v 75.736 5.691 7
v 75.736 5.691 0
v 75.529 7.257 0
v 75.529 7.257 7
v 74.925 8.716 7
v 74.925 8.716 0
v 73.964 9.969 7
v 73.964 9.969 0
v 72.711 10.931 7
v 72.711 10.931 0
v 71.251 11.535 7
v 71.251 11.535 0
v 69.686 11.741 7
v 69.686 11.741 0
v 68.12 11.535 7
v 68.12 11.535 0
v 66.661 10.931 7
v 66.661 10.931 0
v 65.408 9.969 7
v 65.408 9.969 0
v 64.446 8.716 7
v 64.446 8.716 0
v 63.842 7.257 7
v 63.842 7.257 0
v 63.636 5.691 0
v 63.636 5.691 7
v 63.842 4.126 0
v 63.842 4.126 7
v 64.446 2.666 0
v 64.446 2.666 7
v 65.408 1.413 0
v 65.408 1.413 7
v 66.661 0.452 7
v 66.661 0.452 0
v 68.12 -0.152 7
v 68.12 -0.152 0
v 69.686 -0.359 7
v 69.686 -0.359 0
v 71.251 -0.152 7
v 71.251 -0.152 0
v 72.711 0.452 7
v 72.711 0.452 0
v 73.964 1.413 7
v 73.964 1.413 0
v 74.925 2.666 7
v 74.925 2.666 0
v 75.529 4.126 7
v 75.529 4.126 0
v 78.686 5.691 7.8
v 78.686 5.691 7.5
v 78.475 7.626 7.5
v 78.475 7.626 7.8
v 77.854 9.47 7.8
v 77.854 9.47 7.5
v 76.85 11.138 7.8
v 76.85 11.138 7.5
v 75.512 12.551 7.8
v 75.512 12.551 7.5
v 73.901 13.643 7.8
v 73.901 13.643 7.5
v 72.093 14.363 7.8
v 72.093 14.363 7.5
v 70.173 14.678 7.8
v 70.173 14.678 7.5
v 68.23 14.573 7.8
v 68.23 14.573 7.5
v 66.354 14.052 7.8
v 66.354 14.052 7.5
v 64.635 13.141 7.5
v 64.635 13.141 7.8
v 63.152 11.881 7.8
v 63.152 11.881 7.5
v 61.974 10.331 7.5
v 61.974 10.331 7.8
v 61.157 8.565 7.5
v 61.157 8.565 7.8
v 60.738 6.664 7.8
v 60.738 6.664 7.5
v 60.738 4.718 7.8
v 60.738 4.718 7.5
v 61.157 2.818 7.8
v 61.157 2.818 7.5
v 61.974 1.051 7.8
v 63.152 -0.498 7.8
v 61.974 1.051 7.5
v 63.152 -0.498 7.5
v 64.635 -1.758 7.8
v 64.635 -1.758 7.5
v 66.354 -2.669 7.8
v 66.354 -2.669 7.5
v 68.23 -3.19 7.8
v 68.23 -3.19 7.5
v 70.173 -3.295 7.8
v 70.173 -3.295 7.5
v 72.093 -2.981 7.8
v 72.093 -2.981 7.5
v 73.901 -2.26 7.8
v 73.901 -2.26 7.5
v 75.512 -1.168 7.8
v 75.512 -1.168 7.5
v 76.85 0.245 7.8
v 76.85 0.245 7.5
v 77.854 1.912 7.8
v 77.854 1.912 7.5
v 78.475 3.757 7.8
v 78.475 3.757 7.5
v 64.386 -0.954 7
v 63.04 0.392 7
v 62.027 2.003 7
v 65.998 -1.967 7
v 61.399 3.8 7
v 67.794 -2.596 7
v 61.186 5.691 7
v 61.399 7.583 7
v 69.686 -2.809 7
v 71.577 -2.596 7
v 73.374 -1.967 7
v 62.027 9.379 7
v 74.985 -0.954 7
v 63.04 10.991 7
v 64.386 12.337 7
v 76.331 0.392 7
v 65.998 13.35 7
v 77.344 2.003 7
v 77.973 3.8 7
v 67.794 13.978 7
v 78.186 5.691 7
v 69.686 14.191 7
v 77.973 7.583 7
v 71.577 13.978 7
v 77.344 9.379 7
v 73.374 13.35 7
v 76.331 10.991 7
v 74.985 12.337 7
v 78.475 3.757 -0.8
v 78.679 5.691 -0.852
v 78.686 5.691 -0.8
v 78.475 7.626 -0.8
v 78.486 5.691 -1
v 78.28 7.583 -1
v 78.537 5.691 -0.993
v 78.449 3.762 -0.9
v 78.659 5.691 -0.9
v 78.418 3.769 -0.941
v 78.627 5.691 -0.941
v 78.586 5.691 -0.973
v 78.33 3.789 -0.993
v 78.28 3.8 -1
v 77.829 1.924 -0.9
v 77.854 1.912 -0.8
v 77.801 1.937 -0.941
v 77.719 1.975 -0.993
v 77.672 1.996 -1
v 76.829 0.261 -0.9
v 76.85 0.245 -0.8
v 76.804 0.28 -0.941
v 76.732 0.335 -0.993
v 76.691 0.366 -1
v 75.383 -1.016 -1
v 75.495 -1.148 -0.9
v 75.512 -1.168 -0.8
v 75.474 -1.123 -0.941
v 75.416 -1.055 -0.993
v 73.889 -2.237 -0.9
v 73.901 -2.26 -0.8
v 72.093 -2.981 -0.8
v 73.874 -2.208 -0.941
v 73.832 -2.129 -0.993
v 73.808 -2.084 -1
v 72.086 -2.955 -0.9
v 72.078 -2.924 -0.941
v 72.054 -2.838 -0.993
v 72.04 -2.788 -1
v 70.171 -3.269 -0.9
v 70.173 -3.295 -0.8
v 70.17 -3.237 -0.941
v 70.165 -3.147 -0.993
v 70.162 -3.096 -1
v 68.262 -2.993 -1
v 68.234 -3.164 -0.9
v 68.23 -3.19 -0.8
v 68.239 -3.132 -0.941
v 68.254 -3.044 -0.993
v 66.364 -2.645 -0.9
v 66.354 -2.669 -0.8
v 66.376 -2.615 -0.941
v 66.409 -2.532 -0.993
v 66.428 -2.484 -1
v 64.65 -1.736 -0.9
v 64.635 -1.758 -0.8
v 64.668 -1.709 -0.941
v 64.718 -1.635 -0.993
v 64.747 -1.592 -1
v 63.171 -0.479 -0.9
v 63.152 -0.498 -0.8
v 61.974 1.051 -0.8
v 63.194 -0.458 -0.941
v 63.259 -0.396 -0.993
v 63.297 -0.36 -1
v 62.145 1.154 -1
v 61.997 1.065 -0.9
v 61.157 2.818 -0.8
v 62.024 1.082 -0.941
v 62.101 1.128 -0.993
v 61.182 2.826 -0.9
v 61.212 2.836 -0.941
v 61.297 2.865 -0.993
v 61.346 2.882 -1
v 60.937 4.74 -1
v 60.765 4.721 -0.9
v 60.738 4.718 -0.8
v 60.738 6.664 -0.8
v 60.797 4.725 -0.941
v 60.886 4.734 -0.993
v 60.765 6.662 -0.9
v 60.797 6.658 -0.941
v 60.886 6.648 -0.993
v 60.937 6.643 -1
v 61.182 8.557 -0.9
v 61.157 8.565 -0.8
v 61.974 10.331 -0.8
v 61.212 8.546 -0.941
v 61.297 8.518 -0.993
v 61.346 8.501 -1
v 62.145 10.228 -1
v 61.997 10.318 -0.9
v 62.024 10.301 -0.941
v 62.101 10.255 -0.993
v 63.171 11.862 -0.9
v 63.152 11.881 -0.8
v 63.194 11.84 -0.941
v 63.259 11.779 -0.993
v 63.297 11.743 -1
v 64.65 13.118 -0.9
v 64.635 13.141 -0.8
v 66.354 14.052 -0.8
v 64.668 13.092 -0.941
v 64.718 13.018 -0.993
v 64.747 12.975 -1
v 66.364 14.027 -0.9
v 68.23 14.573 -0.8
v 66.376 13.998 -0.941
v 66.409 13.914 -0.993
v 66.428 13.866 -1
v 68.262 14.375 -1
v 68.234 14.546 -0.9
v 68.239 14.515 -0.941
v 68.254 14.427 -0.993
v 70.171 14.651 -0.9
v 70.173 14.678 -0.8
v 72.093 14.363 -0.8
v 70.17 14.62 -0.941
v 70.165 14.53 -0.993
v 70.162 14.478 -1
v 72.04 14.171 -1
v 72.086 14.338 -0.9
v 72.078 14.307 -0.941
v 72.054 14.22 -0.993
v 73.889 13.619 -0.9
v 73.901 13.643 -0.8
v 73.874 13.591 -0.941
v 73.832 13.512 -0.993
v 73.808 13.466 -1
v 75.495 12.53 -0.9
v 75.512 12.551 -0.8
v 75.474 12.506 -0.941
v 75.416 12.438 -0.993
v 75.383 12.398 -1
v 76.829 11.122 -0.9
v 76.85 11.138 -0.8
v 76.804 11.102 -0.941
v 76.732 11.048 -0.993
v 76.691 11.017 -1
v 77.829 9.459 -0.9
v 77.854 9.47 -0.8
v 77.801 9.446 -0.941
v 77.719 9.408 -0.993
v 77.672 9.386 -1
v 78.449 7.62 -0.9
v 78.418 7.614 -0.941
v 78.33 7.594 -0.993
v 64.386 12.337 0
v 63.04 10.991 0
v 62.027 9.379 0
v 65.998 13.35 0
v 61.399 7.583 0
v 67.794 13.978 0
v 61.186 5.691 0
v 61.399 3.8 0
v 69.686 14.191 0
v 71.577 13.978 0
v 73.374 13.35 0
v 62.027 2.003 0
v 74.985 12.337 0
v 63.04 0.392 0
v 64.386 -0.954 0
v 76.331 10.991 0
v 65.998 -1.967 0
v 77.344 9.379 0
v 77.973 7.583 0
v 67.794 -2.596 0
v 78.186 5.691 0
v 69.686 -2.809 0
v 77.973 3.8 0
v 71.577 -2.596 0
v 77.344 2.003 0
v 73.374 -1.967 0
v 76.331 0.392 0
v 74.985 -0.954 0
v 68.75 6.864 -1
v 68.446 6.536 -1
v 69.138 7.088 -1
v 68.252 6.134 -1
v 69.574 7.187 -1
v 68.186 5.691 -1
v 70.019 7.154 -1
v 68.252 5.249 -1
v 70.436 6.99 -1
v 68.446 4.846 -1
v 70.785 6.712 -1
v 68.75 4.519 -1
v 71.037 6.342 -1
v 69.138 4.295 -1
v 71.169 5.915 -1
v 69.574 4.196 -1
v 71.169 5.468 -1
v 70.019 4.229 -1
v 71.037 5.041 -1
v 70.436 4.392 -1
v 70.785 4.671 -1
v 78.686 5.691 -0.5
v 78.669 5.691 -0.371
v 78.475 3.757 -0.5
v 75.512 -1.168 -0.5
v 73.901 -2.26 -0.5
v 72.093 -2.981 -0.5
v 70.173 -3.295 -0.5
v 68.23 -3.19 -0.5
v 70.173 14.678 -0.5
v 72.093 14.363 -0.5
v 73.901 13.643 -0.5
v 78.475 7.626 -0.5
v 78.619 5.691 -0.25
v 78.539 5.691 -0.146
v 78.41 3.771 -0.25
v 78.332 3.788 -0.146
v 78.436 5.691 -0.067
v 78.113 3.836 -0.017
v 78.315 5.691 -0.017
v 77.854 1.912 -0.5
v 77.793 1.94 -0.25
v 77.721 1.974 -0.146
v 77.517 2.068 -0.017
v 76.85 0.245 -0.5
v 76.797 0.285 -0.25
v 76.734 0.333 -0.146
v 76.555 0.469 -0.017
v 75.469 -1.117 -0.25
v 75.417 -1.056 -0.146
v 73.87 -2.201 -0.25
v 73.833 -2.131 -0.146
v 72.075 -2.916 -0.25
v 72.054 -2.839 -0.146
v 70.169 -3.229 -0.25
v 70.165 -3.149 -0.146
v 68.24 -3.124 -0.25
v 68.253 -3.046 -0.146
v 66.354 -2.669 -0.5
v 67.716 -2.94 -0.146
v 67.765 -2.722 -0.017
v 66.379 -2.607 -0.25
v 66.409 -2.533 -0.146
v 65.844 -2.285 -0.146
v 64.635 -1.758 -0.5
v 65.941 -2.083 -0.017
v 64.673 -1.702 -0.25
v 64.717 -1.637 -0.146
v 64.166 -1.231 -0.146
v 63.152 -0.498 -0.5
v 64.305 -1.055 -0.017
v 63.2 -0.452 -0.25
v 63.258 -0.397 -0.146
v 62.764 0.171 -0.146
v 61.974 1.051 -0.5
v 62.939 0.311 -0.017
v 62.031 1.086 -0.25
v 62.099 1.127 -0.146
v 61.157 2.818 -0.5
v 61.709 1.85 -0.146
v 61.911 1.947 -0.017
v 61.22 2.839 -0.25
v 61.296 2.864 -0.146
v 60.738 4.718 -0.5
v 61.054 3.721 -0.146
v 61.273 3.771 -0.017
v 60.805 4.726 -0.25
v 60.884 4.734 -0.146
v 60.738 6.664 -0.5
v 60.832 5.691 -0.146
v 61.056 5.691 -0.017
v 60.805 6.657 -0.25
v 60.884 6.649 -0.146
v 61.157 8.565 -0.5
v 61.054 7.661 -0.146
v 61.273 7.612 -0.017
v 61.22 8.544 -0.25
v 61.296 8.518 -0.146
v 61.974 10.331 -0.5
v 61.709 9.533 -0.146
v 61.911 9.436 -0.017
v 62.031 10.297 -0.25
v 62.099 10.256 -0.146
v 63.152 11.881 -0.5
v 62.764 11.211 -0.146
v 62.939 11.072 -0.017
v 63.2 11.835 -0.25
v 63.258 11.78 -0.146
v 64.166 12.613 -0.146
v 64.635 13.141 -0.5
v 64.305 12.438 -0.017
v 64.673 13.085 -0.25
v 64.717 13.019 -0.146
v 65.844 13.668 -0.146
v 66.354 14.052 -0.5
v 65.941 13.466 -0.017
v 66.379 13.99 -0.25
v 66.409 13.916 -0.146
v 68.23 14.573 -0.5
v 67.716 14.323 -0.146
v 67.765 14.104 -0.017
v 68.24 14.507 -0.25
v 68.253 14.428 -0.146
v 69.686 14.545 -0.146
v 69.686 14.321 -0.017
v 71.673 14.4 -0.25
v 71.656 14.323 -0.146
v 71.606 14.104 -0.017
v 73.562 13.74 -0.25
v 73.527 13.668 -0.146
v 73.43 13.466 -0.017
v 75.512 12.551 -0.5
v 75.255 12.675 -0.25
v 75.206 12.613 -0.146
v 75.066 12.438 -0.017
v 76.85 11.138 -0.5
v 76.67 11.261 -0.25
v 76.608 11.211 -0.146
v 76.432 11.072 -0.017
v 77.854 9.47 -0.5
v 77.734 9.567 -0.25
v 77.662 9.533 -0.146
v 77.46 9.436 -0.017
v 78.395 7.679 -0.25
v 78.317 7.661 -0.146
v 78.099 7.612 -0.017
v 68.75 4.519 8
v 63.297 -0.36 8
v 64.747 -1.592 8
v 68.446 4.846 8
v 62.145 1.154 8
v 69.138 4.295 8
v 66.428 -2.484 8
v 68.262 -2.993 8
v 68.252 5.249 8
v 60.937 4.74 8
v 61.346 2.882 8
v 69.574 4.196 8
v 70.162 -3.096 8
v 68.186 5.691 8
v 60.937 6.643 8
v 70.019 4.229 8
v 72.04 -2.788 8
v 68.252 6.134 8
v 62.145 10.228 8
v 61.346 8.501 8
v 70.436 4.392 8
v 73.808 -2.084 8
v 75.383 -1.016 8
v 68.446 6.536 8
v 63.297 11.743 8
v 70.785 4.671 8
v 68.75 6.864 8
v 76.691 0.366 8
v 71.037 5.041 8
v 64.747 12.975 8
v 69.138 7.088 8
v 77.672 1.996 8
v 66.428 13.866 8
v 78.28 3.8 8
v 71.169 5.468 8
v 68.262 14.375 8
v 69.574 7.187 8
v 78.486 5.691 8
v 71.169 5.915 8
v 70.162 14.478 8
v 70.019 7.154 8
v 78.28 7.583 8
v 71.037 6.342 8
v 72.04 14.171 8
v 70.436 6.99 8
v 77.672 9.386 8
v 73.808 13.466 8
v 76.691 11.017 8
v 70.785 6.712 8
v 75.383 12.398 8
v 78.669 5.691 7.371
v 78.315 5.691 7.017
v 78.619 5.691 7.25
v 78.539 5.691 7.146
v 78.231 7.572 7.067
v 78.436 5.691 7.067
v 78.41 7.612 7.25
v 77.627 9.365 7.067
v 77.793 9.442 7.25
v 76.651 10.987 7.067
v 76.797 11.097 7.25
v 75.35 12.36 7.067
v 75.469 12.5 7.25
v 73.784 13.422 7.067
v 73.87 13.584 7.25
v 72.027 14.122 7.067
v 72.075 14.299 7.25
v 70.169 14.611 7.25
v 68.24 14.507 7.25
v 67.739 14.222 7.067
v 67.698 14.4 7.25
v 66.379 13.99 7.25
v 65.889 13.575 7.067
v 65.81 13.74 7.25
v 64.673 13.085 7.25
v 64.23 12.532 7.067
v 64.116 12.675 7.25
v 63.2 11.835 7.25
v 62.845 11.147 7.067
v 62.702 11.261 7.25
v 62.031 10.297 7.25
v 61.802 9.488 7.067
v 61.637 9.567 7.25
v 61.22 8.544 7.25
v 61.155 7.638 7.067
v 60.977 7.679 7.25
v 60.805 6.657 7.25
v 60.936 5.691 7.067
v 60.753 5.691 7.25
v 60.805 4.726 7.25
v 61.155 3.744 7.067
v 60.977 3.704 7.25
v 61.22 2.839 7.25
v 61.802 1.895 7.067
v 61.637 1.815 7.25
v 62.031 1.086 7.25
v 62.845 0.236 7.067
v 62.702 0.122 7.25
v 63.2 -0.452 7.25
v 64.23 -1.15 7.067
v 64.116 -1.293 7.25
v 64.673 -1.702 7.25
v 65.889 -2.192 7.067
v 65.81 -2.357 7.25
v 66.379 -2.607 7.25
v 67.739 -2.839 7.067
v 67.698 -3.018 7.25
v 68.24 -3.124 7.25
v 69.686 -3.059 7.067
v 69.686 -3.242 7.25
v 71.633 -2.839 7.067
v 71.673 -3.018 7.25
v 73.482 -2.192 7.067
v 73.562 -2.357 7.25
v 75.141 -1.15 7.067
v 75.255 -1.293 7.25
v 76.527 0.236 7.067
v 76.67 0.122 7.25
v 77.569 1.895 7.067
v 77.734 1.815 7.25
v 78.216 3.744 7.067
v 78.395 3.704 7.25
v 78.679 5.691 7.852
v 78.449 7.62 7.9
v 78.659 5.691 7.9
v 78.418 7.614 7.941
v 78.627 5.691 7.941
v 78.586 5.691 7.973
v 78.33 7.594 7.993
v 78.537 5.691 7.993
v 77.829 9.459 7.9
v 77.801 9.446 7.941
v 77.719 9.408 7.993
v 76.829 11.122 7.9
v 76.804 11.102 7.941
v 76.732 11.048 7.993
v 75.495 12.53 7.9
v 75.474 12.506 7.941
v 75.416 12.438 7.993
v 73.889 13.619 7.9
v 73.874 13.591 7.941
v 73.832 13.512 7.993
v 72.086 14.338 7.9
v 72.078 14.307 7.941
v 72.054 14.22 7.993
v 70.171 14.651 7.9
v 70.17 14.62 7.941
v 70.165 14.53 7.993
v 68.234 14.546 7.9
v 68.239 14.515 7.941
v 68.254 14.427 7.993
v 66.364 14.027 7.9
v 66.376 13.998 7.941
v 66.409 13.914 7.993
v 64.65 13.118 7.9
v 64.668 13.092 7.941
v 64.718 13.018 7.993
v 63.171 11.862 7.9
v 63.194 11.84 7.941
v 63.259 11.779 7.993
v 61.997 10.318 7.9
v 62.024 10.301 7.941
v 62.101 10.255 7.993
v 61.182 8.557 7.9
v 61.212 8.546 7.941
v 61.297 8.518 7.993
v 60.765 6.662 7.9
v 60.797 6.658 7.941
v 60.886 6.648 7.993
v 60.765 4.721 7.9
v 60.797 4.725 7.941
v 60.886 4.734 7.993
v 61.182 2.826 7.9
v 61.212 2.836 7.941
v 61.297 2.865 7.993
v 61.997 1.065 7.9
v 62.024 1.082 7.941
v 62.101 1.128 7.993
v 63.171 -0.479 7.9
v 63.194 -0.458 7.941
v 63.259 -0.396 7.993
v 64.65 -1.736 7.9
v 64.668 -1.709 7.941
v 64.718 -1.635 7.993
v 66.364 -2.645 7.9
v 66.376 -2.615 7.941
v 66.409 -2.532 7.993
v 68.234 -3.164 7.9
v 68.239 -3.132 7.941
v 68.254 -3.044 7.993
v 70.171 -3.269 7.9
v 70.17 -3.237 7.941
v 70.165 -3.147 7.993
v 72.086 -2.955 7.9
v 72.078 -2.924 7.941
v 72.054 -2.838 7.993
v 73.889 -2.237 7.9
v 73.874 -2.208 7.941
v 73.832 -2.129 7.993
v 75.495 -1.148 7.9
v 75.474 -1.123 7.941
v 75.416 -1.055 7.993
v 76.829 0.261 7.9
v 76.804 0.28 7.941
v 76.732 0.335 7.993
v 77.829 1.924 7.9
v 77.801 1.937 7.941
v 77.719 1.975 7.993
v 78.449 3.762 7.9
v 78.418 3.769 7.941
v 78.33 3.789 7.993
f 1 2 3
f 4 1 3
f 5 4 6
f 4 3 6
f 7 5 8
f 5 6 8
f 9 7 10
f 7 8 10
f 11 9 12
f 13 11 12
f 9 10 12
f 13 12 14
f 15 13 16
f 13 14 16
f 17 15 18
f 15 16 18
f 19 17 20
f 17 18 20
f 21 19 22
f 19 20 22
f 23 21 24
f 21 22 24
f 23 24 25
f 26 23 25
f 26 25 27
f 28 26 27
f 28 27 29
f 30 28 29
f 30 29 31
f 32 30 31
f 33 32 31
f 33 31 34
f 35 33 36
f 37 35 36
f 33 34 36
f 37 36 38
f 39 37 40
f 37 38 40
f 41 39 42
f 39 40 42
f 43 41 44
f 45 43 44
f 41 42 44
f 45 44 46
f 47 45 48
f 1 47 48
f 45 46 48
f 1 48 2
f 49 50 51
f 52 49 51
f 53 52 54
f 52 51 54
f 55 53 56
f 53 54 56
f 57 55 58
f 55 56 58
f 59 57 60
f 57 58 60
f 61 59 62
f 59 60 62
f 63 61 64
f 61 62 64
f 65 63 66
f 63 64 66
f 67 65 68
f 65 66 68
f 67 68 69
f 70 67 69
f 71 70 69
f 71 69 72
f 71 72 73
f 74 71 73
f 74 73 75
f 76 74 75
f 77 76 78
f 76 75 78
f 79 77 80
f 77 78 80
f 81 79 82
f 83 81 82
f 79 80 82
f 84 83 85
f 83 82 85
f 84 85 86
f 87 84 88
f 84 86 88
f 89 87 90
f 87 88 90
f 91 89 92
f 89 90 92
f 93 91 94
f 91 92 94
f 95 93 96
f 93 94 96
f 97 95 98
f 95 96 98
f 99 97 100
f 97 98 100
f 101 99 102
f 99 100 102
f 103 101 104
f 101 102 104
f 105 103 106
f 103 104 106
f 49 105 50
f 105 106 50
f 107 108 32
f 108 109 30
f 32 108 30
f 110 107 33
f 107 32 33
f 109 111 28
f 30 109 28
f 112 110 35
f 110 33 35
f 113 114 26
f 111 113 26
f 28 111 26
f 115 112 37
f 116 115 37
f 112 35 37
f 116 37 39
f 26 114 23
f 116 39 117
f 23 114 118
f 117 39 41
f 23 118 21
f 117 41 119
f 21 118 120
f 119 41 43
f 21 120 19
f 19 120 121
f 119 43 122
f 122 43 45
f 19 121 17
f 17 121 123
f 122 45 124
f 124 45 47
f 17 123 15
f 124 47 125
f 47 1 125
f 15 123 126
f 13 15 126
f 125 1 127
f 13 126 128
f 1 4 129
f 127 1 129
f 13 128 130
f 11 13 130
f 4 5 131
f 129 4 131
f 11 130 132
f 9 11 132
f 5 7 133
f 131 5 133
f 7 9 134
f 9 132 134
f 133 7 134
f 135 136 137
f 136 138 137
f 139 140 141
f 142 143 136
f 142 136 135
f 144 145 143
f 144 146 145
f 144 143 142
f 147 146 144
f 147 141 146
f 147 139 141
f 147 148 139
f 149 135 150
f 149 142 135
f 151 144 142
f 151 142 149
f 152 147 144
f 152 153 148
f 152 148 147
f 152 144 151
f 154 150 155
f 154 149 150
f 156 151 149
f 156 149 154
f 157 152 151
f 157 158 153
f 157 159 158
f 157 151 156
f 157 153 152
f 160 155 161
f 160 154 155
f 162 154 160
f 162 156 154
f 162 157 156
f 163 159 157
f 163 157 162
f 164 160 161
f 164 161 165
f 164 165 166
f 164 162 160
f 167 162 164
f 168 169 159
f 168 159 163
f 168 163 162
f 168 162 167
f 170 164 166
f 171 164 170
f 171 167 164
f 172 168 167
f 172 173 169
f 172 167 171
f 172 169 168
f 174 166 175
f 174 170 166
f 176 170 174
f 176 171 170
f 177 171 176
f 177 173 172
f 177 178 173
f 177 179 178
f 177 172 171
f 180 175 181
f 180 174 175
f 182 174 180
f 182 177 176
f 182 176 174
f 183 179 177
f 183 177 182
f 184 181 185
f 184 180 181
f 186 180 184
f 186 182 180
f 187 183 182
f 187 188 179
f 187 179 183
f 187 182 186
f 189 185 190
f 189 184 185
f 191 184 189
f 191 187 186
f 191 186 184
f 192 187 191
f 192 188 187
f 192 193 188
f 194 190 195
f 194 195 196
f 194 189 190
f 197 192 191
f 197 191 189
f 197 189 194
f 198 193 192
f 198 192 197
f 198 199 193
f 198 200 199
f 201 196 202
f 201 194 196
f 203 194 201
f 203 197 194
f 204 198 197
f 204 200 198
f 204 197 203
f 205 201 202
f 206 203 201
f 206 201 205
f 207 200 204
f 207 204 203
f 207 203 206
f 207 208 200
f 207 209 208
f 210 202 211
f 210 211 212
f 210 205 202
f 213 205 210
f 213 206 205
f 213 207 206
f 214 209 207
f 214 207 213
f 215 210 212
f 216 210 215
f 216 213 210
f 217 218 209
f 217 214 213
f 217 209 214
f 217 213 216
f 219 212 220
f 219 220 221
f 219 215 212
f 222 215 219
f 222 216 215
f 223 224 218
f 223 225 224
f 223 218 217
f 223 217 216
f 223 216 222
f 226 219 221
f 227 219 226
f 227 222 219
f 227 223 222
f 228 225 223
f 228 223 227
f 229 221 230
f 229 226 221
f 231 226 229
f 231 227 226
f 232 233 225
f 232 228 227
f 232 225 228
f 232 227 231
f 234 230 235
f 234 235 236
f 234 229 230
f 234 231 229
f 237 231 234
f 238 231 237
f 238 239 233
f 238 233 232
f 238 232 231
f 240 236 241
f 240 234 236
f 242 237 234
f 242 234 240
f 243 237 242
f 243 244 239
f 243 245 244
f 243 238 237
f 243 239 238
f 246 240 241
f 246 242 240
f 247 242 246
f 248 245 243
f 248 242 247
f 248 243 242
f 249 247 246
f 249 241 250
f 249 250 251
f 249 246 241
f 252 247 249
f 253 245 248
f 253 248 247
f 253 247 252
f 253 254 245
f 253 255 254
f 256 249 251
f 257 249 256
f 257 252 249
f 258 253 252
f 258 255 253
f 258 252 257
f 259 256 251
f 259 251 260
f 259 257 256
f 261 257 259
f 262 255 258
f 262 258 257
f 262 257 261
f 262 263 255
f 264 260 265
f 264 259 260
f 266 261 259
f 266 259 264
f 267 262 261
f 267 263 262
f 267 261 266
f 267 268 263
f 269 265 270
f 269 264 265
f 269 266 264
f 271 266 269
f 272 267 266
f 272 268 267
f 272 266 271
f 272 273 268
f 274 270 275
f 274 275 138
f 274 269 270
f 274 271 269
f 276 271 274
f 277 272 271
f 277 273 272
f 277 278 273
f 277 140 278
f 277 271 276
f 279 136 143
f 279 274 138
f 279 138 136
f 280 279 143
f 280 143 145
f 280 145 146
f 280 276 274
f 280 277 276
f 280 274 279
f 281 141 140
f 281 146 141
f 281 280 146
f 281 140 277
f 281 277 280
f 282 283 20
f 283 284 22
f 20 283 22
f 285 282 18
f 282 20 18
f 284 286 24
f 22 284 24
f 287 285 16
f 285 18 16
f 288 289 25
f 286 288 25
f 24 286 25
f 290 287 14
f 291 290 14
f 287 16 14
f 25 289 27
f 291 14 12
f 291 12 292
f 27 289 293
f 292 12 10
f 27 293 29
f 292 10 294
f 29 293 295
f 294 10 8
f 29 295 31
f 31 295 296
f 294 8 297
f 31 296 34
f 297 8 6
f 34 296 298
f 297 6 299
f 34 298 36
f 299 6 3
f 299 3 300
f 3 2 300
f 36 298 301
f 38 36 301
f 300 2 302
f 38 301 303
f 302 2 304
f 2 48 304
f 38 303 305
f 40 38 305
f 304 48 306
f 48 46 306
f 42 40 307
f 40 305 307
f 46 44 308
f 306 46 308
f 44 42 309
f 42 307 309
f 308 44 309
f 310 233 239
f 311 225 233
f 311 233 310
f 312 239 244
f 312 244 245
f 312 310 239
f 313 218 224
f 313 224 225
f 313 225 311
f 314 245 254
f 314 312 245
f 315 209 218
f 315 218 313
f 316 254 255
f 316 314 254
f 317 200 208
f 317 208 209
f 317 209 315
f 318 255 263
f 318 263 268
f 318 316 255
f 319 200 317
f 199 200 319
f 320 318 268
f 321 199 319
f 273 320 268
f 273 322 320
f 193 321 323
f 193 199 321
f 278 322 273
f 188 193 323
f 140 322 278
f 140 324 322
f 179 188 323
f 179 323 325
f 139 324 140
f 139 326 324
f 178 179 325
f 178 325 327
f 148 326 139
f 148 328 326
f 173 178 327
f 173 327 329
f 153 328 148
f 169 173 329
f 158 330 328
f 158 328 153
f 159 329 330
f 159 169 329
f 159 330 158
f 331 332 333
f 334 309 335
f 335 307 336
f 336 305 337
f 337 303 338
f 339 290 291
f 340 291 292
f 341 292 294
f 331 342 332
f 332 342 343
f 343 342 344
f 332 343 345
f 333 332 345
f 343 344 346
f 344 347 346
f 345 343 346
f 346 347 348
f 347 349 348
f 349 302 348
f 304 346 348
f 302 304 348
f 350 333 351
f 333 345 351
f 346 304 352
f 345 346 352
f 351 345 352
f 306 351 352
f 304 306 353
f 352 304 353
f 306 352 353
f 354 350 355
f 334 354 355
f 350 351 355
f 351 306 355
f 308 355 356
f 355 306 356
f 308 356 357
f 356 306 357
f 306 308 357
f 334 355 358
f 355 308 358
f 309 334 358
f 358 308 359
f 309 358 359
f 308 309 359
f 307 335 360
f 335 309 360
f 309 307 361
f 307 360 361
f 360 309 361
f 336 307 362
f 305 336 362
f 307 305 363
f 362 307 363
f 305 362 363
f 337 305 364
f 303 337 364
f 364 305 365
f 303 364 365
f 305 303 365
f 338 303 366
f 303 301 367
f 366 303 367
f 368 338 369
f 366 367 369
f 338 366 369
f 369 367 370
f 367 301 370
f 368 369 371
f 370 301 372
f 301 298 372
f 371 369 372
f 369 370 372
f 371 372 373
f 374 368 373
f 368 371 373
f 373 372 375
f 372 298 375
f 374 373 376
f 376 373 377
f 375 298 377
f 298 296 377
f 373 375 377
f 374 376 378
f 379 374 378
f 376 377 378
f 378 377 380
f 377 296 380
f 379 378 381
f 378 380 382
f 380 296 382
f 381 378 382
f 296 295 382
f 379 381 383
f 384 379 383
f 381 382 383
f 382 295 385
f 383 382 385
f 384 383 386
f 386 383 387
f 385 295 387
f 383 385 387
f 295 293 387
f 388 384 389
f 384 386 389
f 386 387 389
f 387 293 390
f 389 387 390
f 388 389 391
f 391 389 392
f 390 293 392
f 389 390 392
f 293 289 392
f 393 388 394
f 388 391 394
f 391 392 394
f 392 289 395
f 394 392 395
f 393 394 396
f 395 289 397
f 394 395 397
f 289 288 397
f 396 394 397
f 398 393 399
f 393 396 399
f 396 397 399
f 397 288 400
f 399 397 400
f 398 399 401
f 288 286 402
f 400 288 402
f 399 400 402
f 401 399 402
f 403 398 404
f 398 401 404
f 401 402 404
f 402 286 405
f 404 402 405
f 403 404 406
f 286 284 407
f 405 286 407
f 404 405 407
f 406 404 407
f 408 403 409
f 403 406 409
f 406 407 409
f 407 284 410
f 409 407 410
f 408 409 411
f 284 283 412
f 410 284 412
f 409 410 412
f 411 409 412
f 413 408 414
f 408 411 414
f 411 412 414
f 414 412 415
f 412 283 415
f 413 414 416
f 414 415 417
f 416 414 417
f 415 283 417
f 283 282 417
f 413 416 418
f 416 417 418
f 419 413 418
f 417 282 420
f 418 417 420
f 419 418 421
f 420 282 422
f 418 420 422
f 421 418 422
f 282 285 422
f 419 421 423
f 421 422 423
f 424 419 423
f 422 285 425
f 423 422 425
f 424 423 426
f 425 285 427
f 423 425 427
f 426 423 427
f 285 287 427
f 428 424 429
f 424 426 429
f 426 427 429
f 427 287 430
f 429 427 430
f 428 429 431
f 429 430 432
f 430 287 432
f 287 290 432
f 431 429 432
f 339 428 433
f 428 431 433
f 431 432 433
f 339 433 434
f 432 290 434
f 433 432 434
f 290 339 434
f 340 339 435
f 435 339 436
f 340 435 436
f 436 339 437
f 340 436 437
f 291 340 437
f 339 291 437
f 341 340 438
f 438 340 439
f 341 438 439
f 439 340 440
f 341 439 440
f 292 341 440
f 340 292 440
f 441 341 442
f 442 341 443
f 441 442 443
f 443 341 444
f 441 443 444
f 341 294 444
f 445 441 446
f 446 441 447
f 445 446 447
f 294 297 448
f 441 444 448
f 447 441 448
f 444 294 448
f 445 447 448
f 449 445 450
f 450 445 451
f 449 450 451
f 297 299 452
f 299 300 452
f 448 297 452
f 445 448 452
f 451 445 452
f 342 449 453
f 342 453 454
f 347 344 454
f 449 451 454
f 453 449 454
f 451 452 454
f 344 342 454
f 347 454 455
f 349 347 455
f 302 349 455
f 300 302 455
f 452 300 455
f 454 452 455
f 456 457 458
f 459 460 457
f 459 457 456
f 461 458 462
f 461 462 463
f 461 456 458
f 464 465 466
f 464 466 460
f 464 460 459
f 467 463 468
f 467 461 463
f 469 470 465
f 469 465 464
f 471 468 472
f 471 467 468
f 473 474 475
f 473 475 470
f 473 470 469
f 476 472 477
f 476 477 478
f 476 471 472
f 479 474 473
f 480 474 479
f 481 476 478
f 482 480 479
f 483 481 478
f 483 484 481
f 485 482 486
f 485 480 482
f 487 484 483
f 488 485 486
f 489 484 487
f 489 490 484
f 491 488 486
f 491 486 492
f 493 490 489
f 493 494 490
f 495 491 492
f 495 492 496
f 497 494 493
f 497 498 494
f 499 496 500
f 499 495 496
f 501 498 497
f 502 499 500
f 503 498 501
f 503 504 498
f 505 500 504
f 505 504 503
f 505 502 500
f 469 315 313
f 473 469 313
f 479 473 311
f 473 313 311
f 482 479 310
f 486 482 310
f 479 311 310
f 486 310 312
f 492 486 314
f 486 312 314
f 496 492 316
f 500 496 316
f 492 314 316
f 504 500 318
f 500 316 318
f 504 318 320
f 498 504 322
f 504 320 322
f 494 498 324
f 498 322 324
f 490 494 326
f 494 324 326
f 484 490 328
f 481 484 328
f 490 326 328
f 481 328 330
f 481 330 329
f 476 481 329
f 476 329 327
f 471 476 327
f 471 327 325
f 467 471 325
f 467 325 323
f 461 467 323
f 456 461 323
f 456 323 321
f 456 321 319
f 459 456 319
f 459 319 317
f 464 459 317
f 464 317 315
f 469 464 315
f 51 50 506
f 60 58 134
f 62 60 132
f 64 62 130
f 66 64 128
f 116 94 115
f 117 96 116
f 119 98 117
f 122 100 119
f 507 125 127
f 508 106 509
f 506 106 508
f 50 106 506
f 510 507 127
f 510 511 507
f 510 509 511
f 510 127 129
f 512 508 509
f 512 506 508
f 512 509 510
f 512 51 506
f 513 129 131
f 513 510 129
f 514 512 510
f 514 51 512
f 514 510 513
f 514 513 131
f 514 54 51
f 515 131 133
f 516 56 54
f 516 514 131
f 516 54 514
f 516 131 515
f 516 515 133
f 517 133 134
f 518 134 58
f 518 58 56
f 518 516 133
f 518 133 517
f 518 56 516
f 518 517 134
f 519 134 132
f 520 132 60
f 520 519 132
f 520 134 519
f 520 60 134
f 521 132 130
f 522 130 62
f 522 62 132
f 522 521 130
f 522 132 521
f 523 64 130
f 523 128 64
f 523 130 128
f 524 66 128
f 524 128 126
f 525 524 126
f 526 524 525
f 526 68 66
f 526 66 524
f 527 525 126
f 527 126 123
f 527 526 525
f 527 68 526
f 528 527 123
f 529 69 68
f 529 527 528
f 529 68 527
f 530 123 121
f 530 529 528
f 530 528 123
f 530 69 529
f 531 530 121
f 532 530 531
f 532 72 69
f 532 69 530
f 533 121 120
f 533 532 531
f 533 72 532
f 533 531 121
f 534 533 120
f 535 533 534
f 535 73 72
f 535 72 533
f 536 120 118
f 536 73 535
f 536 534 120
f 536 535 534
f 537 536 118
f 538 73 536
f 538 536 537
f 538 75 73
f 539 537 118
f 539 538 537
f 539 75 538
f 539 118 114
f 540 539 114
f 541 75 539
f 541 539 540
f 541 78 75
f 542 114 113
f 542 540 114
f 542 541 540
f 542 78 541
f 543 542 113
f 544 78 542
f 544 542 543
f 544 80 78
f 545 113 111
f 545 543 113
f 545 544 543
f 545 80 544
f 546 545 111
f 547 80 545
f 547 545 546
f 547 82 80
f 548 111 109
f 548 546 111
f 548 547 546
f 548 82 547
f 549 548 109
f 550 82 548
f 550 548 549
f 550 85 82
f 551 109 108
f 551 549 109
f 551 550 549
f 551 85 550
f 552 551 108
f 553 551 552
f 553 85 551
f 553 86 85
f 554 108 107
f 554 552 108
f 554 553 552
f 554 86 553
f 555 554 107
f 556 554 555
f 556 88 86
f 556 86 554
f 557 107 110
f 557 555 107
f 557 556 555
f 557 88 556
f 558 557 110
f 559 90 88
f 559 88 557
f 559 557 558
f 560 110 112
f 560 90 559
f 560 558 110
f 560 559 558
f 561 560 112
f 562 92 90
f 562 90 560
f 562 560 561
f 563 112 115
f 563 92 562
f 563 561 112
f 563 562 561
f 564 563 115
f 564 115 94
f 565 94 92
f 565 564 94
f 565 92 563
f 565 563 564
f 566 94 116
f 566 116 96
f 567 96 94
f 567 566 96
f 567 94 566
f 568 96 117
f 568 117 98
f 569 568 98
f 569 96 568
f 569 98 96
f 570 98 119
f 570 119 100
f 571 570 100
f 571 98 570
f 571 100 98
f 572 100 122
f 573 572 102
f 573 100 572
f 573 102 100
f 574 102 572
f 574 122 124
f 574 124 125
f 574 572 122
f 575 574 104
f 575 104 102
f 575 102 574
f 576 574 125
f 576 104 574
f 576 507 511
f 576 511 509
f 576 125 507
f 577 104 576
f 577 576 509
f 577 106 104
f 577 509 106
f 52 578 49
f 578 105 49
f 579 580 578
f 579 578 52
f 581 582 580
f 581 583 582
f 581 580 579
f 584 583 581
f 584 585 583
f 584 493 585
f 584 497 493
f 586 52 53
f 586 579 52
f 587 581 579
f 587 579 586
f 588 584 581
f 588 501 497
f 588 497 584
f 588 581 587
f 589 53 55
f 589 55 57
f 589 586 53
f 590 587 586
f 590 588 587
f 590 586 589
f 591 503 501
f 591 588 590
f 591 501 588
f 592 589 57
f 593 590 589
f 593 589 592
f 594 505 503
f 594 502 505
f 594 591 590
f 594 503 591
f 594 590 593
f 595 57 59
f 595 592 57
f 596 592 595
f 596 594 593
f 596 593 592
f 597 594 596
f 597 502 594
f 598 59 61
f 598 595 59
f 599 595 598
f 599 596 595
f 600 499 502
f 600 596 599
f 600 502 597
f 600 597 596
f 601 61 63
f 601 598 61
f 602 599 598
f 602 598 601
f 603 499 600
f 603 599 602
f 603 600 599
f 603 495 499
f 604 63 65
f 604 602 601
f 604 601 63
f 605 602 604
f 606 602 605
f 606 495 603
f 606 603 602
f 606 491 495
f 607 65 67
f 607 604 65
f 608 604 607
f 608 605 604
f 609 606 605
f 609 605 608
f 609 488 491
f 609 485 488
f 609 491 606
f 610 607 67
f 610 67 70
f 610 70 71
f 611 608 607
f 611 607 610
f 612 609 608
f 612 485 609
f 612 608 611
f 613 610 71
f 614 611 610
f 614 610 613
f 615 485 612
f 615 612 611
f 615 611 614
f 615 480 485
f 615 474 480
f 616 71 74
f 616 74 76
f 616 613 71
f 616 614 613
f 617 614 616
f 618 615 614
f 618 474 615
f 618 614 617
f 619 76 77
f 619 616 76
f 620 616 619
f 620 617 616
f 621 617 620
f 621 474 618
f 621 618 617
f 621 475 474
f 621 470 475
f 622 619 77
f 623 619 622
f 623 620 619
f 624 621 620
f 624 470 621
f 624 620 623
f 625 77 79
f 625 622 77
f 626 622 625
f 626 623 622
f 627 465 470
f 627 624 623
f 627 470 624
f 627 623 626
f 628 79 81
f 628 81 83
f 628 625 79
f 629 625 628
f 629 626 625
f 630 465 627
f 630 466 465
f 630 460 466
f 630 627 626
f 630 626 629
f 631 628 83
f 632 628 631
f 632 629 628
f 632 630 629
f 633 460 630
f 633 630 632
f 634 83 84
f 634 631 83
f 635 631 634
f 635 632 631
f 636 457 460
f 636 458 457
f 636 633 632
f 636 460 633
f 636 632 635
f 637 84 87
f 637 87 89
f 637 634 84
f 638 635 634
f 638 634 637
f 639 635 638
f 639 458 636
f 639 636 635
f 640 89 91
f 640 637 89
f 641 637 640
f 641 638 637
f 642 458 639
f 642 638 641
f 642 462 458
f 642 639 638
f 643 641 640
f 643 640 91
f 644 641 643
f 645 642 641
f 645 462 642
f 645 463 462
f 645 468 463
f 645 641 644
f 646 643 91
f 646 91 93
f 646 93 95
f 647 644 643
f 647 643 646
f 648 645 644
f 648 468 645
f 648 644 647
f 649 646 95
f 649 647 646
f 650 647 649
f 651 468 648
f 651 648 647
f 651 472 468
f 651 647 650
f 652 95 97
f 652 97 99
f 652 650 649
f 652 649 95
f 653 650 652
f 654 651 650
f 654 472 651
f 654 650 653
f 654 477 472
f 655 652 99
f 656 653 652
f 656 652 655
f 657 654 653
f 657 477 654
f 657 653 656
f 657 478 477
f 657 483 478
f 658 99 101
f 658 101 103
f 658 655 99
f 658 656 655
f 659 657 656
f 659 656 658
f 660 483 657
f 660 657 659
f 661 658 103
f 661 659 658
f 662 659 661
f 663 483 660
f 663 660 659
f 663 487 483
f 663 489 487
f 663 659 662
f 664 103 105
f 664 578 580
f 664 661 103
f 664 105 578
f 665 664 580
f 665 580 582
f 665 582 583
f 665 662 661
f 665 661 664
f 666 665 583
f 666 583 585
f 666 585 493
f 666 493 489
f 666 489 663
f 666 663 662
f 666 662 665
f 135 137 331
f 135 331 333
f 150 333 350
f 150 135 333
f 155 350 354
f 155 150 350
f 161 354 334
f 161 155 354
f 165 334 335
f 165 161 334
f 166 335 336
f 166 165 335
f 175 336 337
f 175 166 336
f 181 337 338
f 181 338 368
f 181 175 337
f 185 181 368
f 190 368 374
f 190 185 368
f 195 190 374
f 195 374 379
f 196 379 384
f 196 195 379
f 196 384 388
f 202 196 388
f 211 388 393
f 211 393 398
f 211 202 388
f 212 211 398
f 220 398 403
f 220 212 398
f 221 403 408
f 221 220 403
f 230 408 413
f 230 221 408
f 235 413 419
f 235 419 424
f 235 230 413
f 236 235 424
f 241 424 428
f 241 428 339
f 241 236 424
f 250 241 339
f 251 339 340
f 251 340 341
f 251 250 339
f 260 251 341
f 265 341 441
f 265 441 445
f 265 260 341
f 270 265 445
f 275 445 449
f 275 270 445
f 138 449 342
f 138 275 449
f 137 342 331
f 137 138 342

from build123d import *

# Parameters (mm, degrees)
SKETCH1_R           = 6.05
BOSS_EXTRUDE1_DEPTH = 7
SKETCH4_R           = 9
BOSS_EXTRUDE2_DEPTH = 1
BOSS_EXTRUDE3_START = 1
SKETCH6_R           = 9
BOSS_EXTRUDE3_DEPTH = 1
FILLET1_R           = 0.5
FILLET2_R           = 0.5
FILLET3_R           = 0.2
FILLET4_R           = 0.2
SKETCH11_R          = 1.5
CUT_EXTRUDE1_DEPTH  = 81.5497711


with BuildPart() as part:
    # Sketch1 → Boss-Extrude1 (new body)
    with BuildSketch(Plane.XY):
        with Locations((69.685635463, 5.691370847)):
            Circle(SKETCH1_R)
    extrude(amount=BOSS_EXTRUDE1_DEPTH)

    # Sketch4 → Boss-Extrude2 (add)
    with BuildSketch(Plane.XY.offset(7)):
        with Locations((69.685635463, 5.691370847)):
            Circle(SKETCH4_R)
    extrude(amount=BOSS_EXTRUDE2_DEPTH)

    # Sketch6 → Boss-Extrude3 (add)
    with BuildSketch(Plane(origin=(0, 0, 0), x_dir=(-1, 0, 0), z_dir=(0, 0, -1)).offset(BOSS_EXTRUDE3_START)):
        with Locations(Location((-69.685635463, 5.691370847, 0), (0, 0, 180))):
            Circle(SKETCH6_R)
    extrude(amount=-BOSS_EXTRUDE3_DEPTH)

    # Fillet1
    fillet1_edges = [part.edges().sort_by_distance(p)[0] for p in [
        (60.685635463, 5.691370847, 0),
    ]]
    fillet(fillet1_edges, radius=FILLET1_R)

    # Fillet2
    fillet2_edges = [part.edges().sort_by_distance(p)[0] for p in [
        (60.685635463, 5.691370847, 7),
    ]]
    fillet(fillet2_edges, radius=FILLET2_R)

    # Fillet3
    fillet3_edges = [part.edges().sort_by_distance(p)[0] for p in [
        (60.685635463, 5.691370847, 8),
    ]]
    fillet(fillet3_edges, radius=FILLET3_R)

    # Fillet4
    fillet4_edges = [part.edges().sort_by_distance(p)[0] for p in [
        (60.685635463, 5.691370847, -1),
    ]]
    fillet(fillet4_edges, radius=FILLET4_R)

    # Sketch11 → Cut-Extrude1 (cut, through all)
    with BuildSketch(Plane(origin=(0, 0, -1), x_dir=(-1, 0, 0), z_dir=(0, 0, -1))):
        with Locations((-69.685635463, 5.691370847)):
            Circle(SKETCH11_R)
    extrude(amount=-CUT_EXTRUDE1_DEPTH, mode=Mode.SUBTRACT)


solid = part.part
